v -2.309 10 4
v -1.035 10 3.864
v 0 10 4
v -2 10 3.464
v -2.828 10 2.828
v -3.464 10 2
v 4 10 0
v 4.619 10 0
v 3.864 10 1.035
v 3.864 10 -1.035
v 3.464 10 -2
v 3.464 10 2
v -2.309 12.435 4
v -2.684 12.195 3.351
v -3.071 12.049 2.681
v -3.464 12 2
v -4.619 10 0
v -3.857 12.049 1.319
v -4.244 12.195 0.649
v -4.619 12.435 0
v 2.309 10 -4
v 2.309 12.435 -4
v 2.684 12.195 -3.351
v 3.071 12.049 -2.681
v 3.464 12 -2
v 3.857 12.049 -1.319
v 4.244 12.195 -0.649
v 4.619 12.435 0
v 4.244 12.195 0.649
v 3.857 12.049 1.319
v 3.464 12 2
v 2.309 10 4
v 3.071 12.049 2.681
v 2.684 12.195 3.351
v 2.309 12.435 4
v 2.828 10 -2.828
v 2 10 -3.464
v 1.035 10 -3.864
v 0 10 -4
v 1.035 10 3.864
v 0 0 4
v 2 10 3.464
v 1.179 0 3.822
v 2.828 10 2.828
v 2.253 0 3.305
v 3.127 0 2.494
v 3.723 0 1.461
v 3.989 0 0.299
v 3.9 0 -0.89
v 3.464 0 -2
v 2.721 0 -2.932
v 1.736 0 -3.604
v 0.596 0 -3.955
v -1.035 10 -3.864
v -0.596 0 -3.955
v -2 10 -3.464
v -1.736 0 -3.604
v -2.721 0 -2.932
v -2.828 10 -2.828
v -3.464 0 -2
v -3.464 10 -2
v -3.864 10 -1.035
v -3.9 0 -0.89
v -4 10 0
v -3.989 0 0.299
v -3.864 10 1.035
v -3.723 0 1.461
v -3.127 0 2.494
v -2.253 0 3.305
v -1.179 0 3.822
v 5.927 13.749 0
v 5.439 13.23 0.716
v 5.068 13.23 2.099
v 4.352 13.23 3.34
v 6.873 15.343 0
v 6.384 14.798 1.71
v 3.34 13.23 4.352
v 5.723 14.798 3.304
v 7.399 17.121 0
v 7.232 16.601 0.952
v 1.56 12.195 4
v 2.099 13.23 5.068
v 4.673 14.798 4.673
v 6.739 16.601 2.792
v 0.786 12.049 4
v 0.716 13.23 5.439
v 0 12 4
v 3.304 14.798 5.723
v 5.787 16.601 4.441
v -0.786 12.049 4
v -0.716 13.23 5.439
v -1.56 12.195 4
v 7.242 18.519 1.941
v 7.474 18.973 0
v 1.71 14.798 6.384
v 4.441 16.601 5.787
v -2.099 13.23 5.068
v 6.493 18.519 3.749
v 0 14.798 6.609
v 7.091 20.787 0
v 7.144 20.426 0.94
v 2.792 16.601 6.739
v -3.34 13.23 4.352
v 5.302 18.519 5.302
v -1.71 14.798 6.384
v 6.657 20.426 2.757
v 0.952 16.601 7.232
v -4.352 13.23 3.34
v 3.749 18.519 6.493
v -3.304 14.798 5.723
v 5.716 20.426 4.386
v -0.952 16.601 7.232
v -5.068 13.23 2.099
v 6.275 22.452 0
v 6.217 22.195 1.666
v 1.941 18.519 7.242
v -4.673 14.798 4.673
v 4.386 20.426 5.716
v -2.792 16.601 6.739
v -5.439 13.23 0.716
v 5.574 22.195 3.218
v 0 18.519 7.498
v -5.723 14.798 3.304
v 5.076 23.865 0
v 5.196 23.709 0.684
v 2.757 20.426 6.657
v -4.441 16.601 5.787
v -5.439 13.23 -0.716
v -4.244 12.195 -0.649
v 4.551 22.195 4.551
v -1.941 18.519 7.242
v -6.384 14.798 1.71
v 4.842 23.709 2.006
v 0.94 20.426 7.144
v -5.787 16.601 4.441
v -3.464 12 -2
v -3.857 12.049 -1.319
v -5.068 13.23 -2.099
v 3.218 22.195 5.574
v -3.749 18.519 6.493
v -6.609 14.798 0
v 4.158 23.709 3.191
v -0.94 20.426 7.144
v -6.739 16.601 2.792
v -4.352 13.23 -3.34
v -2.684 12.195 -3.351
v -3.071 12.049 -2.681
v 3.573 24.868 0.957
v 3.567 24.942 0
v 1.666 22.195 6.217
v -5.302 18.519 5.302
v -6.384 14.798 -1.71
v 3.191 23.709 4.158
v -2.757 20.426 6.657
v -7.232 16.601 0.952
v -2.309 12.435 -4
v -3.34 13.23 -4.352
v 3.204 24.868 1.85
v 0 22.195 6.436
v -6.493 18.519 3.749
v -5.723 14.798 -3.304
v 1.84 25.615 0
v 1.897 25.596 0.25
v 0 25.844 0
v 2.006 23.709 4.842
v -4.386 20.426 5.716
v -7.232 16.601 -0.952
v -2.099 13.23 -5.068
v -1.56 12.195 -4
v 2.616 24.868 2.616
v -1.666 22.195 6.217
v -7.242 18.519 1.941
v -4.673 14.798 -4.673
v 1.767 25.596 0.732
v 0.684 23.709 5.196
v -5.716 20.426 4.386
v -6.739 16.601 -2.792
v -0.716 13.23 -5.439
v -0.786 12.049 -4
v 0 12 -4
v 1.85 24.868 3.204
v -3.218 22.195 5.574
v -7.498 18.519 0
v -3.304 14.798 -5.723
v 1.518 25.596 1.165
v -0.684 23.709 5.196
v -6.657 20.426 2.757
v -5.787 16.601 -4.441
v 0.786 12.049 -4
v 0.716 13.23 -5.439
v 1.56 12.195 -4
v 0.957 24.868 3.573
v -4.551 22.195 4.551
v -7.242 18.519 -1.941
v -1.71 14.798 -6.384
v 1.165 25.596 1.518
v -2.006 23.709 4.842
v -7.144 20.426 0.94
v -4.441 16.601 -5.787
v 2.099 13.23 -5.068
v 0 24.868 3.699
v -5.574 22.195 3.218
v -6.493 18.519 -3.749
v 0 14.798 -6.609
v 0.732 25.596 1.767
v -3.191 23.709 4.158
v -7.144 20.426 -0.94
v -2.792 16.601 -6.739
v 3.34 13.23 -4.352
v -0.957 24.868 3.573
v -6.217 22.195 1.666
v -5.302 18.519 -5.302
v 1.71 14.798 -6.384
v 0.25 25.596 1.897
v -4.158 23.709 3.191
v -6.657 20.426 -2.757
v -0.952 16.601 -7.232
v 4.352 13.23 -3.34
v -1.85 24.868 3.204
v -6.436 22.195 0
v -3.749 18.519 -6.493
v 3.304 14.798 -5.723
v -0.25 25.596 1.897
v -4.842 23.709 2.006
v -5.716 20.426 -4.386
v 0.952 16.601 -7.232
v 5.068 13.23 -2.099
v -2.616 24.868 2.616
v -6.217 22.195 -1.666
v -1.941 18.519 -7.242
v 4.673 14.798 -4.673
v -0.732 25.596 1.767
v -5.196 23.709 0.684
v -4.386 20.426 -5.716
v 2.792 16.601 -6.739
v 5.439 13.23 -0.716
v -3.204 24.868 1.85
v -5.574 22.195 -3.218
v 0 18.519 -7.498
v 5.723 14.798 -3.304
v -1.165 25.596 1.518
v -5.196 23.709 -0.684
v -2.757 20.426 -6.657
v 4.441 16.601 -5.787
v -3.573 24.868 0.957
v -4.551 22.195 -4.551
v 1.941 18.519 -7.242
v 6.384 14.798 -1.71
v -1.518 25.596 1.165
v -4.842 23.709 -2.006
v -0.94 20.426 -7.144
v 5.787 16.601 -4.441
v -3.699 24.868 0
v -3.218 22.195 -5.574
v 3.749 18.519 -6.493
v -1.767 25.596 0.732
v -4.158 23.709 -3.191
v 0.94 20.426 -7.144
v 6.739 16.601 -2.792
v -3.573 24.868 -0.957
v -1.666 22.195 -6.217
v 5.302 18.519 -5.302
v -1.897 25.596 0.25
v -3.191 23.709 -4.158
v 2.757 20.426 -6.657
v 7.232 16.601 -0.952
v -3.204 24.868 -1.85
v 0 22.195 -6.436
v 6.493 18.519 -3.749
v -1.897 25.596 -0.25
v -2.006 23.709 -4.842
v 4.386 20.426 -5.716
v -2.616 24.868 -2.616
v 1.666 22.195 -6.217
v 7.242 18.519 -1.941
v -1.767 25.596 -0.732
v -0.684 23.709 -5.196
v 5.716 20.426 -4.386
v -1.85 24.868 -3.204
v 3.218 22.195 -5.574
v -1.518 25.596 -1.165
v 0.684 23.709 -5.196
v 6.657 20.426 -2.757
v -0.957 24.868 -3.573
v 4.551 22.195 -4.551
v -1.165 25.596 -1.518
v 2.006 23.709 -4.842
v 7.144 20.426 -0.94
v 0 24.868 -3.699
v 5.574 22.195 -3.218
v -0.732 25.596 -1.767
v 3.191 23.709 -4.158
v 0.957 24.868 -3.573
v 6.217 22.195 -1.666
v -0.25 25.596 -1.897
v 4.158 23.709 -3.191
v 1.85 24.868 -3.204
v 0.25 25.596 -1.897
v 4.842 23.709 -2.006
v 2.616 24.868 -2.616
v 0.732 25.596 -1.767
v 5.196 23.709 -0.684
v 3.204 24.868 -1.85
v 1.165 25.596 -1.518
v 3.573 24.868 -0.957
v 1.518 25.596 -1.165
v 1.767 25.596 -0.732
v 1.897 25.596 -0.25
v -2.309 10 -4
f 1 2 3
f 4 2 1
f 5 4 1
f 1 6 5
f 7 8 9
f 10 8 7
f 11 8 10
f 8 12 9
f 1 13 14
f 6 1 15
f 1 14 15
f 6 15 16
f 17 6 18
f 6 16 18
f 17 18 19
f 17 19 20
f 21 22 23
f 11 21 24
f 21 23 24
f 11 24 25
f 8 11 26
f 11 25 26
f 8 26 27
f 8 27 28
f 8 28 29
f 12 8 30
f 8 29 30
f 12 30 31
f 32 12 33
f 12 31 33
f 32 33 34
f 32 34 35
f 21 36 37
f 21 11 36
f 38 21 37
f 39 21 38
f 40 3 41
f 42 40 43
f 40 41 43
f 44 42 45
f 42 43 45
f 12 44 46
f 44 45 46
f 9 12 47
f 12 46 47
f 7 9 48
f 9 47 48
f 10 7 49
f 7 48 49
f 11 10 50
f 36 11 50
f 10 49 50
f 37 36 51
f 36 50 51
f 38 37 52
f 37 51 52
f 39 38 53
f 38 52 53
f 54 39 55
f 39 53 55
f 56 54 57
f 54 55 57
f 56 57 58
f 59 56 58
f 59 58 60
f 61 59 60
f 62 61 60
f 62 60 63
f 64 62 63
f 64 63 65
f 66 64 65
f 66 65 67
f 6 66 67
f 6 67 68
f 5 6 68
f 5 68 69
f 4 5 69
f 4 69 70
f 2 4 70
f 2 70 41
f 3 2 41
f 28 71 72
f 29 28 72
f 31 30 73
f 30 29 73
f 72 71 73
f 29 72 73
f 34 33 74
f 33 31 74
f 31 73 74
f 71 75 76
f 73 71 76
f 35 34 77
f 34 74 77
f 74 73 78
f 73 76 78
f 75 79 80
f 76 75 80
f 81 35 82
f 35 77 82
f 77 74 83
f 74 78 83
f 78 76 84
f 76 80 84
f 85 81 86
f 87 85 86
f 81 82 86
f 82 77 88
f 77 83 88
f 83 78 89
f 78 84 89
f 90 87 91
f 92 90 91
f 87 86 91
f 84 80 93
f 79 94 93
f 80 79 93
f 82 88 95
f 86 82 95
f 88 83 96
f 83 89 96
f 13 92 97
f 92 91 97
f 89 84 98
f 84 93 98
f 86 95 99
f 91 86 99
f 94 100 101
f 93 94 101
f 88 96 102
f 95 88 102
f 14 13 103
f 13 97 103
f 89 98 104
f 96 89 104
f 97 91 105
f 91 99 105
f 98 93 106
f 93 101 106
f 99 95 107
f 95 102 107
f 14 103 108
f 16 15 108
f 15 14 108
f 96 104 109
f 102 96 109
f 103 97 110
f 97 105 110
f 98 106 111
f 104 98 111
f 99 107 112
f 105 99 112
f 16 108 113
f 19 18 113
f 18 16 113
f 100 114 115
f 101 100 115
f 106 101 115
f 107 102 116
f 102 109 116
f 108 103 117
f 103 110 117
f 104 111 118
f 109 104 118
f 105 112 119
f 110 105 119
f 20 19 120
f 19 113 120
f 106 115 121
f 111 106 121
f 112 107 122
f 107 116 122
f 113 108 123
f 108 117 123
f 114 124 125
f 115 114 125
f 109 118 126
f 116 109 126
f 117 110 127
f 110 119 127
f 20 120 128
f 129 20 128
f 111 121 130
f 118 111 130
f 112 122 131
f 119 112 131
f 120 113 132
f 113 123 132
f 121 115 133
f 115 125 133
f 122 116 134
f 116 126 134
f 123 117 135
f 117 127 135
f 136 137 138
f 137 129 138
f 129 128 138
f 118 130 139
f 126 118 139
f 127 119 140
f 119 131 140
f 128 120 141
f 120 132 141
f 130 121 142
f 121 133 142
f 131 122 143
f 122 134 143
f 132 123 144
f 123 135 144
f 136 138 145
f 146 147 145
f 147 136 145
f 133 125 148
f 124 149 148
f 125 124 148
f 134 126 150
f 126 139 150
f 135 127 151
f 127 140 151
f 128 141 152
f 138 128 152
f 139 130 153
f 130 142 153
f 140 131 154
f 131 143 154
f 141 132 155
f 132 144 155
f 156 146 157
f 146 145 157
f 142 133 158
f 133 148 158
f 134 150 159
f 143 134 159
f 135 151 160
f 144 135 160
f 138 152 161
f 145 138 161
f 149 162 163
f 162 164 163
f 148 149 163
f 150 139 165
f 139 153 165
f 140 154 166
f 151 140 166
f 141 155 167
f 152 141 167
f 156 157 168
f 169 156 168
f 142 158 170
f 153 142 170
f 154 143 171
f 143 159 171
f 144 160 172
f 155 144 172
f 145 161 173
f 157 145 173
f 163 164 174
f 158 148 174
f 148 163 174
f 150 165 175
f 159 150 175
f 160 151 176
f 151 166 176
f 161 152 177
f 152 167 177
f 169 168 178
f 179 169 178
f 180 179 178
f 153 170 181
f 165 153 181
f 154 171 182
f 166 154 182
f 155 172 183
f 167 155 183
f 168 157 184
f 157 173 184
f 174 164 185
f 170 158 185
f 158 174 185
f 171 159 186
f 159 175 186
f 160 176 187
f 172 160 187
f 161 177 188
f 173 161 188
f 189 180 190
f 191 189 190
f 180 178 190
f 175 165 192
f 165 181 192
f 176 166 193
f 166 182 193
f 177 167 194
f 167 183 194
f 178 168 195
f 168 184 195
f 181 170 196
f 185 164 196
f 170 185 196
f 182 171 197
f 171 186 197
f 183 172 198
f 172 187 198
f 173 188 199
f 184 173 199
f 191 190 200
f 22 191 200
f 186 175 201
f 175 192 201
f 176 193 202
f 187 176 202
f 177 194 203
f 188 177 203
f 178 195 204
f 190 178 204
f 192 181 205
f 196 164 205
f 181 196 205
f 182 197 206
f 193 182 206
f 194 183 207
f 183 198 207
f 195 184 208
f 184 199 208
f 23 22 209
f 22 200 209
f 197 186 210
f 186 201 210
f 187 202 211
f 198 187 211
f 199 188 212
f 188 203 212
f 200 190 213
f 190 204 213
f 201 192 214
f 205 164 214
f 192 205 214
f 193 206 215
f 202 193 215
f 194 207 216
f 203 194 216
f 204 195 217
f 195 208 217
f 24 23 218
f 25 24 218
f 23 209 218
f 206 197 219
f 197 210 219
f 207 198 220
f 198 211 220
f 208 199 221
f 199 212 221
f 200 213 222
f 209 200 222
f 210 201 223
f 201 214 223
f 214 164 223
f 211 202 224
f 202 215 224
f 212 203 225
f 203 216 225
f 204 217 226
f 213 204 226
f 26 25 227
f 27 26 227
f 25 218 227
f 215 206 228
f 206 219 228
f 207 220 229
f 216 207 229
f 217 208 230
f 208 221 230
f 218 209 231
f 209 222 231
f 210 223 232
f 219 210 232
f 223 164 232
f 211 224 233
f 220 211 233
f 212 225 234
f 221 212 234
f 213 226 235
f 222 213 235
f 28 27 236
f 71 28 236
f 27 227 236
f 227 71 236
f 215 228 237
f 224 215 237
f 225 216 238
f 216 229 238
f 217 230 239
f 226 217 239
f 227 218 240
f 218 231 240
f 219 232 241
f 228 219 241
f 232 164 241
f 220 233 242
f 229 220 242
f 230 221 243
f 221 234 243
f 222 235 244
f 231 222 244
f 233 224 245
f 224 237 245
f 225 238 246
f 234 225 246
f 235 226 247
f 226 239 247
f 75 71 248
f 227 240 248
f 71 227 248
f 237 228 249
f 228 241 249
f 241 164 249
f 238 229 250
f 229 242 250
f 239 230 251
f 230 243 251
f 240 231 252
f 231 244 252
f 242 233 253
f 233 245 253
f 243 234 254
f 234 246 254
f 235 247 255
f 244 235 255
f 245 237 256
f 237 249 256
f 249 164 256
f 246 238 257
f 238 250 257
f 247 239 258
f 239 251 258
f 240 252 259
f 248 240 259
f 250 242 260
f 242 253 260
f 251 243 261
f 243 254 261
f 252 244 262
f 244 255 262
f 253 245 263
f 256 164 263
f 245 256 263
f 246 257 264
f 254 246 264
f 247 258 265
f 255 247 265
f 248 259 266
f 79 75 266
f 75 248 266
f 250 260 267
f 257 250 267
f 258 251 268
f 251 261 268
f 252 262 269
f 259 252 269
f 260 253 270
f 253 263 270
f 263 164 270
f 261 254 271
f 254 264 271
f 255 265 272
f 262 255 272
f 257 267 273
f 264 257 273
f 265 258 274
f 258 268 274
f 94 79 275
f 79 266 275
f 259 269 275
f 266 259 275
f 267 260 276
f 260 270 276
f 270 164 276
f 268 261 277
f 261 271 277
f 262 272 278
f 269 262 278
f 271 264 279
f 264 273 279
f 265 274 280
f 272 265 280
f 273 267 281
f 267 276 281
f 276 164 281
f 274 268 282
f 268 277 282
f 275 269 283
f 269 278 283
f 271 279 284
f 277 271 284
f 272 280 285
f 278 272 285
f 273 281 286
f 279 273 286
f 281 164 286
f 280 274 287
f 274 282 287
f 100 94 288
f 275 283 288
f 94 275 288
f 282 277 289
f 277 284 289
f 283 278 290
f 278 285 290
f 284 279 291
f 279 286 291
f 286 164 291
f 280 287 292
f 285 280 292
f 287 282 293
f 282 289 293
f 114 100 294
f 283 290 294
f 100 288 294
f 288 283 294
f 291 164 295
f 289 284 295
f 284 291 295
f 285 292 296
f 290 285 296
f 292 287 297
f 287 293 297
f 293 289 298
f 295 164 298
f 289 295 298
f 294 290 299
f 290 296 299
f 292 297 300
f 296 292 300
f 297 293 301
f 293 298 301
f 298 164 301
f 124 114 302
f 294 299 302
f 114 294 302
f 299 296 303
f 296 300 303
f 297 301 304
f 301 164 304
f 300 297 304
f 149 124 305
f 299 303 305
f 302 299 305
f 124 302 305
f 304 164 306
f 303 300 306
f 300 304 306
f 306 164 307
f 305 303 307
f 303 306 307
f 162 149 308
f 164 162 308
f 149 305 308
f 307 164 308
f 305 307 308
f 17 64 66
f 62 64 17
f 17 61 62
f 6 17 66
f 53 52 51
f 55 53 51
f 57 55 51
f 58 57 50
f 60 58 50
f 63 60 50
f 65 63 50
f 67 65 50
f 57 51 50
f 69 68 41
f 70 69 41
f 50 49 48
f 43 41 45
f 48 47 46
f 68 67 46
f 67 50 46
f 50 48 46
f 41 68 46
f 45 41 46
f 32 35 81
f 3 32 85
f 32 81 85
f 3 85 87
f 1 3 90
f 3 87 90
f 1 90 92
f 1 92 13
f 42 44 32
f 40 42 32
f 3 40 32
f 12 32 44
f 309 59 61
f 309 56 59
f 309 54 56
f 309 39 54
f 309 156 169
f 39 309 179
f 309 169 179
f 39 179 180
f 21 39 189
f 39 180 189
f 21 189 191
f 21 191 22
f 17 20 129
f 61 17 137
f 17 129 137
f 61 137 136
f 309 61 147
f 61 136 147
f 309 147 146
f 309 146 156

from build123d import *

# Parameters (mm, degrees)
SKETCH1_R           = 4
BOSS_EXTRUDE1_DEPTH = 12
BOSS_EXTRUDE3_DEPTH = 3


with BuildPart() as part:
    # Sketch1 → Boss-Extrude1 (new body)
    with BuildSketch(Plane(origin=(0, 0, 0), x_dir=(1, 0, 0), z_dir=(0, 1, 0))):
        with Locations(Location((0, 0, 0), (0, 0, 270))):
            Circle(SKETCH1_R)
    extrude(amount=BOSS_EXTRUDE1_DEPTH)

    # Sketch2 → Revolve1 (revolve)
    with BuildSketch(Plane.XY):
        with BuildLine():
            Line((0, 25.84428877), (0, 10.84428877))
            ThreePointArc((0, 10.84428877), (7.5, 18.34428877), (0, 25.84428877))
        make_face()
    revolve(axis=Axis((0, 25.84428877, 0), (0, -1, 0)))

    # Sketch4 → Boss-Extrude3 (add)
    with BuildSketch(Plane(origin=(0, 13, 0), x_dir=(-1, 0, 0), z_dir=(0, -1, 0))):
        Polygon((2.309401077, 4), (-2.309401077, 4), (-4.618802154, 0), (-2.309401077, -4), (2.309401077, -4), (4.618802154, 0), align=None)
    extrude(amount=BOSS_EXTRUDE3_DEPTH)


solid = part.part
